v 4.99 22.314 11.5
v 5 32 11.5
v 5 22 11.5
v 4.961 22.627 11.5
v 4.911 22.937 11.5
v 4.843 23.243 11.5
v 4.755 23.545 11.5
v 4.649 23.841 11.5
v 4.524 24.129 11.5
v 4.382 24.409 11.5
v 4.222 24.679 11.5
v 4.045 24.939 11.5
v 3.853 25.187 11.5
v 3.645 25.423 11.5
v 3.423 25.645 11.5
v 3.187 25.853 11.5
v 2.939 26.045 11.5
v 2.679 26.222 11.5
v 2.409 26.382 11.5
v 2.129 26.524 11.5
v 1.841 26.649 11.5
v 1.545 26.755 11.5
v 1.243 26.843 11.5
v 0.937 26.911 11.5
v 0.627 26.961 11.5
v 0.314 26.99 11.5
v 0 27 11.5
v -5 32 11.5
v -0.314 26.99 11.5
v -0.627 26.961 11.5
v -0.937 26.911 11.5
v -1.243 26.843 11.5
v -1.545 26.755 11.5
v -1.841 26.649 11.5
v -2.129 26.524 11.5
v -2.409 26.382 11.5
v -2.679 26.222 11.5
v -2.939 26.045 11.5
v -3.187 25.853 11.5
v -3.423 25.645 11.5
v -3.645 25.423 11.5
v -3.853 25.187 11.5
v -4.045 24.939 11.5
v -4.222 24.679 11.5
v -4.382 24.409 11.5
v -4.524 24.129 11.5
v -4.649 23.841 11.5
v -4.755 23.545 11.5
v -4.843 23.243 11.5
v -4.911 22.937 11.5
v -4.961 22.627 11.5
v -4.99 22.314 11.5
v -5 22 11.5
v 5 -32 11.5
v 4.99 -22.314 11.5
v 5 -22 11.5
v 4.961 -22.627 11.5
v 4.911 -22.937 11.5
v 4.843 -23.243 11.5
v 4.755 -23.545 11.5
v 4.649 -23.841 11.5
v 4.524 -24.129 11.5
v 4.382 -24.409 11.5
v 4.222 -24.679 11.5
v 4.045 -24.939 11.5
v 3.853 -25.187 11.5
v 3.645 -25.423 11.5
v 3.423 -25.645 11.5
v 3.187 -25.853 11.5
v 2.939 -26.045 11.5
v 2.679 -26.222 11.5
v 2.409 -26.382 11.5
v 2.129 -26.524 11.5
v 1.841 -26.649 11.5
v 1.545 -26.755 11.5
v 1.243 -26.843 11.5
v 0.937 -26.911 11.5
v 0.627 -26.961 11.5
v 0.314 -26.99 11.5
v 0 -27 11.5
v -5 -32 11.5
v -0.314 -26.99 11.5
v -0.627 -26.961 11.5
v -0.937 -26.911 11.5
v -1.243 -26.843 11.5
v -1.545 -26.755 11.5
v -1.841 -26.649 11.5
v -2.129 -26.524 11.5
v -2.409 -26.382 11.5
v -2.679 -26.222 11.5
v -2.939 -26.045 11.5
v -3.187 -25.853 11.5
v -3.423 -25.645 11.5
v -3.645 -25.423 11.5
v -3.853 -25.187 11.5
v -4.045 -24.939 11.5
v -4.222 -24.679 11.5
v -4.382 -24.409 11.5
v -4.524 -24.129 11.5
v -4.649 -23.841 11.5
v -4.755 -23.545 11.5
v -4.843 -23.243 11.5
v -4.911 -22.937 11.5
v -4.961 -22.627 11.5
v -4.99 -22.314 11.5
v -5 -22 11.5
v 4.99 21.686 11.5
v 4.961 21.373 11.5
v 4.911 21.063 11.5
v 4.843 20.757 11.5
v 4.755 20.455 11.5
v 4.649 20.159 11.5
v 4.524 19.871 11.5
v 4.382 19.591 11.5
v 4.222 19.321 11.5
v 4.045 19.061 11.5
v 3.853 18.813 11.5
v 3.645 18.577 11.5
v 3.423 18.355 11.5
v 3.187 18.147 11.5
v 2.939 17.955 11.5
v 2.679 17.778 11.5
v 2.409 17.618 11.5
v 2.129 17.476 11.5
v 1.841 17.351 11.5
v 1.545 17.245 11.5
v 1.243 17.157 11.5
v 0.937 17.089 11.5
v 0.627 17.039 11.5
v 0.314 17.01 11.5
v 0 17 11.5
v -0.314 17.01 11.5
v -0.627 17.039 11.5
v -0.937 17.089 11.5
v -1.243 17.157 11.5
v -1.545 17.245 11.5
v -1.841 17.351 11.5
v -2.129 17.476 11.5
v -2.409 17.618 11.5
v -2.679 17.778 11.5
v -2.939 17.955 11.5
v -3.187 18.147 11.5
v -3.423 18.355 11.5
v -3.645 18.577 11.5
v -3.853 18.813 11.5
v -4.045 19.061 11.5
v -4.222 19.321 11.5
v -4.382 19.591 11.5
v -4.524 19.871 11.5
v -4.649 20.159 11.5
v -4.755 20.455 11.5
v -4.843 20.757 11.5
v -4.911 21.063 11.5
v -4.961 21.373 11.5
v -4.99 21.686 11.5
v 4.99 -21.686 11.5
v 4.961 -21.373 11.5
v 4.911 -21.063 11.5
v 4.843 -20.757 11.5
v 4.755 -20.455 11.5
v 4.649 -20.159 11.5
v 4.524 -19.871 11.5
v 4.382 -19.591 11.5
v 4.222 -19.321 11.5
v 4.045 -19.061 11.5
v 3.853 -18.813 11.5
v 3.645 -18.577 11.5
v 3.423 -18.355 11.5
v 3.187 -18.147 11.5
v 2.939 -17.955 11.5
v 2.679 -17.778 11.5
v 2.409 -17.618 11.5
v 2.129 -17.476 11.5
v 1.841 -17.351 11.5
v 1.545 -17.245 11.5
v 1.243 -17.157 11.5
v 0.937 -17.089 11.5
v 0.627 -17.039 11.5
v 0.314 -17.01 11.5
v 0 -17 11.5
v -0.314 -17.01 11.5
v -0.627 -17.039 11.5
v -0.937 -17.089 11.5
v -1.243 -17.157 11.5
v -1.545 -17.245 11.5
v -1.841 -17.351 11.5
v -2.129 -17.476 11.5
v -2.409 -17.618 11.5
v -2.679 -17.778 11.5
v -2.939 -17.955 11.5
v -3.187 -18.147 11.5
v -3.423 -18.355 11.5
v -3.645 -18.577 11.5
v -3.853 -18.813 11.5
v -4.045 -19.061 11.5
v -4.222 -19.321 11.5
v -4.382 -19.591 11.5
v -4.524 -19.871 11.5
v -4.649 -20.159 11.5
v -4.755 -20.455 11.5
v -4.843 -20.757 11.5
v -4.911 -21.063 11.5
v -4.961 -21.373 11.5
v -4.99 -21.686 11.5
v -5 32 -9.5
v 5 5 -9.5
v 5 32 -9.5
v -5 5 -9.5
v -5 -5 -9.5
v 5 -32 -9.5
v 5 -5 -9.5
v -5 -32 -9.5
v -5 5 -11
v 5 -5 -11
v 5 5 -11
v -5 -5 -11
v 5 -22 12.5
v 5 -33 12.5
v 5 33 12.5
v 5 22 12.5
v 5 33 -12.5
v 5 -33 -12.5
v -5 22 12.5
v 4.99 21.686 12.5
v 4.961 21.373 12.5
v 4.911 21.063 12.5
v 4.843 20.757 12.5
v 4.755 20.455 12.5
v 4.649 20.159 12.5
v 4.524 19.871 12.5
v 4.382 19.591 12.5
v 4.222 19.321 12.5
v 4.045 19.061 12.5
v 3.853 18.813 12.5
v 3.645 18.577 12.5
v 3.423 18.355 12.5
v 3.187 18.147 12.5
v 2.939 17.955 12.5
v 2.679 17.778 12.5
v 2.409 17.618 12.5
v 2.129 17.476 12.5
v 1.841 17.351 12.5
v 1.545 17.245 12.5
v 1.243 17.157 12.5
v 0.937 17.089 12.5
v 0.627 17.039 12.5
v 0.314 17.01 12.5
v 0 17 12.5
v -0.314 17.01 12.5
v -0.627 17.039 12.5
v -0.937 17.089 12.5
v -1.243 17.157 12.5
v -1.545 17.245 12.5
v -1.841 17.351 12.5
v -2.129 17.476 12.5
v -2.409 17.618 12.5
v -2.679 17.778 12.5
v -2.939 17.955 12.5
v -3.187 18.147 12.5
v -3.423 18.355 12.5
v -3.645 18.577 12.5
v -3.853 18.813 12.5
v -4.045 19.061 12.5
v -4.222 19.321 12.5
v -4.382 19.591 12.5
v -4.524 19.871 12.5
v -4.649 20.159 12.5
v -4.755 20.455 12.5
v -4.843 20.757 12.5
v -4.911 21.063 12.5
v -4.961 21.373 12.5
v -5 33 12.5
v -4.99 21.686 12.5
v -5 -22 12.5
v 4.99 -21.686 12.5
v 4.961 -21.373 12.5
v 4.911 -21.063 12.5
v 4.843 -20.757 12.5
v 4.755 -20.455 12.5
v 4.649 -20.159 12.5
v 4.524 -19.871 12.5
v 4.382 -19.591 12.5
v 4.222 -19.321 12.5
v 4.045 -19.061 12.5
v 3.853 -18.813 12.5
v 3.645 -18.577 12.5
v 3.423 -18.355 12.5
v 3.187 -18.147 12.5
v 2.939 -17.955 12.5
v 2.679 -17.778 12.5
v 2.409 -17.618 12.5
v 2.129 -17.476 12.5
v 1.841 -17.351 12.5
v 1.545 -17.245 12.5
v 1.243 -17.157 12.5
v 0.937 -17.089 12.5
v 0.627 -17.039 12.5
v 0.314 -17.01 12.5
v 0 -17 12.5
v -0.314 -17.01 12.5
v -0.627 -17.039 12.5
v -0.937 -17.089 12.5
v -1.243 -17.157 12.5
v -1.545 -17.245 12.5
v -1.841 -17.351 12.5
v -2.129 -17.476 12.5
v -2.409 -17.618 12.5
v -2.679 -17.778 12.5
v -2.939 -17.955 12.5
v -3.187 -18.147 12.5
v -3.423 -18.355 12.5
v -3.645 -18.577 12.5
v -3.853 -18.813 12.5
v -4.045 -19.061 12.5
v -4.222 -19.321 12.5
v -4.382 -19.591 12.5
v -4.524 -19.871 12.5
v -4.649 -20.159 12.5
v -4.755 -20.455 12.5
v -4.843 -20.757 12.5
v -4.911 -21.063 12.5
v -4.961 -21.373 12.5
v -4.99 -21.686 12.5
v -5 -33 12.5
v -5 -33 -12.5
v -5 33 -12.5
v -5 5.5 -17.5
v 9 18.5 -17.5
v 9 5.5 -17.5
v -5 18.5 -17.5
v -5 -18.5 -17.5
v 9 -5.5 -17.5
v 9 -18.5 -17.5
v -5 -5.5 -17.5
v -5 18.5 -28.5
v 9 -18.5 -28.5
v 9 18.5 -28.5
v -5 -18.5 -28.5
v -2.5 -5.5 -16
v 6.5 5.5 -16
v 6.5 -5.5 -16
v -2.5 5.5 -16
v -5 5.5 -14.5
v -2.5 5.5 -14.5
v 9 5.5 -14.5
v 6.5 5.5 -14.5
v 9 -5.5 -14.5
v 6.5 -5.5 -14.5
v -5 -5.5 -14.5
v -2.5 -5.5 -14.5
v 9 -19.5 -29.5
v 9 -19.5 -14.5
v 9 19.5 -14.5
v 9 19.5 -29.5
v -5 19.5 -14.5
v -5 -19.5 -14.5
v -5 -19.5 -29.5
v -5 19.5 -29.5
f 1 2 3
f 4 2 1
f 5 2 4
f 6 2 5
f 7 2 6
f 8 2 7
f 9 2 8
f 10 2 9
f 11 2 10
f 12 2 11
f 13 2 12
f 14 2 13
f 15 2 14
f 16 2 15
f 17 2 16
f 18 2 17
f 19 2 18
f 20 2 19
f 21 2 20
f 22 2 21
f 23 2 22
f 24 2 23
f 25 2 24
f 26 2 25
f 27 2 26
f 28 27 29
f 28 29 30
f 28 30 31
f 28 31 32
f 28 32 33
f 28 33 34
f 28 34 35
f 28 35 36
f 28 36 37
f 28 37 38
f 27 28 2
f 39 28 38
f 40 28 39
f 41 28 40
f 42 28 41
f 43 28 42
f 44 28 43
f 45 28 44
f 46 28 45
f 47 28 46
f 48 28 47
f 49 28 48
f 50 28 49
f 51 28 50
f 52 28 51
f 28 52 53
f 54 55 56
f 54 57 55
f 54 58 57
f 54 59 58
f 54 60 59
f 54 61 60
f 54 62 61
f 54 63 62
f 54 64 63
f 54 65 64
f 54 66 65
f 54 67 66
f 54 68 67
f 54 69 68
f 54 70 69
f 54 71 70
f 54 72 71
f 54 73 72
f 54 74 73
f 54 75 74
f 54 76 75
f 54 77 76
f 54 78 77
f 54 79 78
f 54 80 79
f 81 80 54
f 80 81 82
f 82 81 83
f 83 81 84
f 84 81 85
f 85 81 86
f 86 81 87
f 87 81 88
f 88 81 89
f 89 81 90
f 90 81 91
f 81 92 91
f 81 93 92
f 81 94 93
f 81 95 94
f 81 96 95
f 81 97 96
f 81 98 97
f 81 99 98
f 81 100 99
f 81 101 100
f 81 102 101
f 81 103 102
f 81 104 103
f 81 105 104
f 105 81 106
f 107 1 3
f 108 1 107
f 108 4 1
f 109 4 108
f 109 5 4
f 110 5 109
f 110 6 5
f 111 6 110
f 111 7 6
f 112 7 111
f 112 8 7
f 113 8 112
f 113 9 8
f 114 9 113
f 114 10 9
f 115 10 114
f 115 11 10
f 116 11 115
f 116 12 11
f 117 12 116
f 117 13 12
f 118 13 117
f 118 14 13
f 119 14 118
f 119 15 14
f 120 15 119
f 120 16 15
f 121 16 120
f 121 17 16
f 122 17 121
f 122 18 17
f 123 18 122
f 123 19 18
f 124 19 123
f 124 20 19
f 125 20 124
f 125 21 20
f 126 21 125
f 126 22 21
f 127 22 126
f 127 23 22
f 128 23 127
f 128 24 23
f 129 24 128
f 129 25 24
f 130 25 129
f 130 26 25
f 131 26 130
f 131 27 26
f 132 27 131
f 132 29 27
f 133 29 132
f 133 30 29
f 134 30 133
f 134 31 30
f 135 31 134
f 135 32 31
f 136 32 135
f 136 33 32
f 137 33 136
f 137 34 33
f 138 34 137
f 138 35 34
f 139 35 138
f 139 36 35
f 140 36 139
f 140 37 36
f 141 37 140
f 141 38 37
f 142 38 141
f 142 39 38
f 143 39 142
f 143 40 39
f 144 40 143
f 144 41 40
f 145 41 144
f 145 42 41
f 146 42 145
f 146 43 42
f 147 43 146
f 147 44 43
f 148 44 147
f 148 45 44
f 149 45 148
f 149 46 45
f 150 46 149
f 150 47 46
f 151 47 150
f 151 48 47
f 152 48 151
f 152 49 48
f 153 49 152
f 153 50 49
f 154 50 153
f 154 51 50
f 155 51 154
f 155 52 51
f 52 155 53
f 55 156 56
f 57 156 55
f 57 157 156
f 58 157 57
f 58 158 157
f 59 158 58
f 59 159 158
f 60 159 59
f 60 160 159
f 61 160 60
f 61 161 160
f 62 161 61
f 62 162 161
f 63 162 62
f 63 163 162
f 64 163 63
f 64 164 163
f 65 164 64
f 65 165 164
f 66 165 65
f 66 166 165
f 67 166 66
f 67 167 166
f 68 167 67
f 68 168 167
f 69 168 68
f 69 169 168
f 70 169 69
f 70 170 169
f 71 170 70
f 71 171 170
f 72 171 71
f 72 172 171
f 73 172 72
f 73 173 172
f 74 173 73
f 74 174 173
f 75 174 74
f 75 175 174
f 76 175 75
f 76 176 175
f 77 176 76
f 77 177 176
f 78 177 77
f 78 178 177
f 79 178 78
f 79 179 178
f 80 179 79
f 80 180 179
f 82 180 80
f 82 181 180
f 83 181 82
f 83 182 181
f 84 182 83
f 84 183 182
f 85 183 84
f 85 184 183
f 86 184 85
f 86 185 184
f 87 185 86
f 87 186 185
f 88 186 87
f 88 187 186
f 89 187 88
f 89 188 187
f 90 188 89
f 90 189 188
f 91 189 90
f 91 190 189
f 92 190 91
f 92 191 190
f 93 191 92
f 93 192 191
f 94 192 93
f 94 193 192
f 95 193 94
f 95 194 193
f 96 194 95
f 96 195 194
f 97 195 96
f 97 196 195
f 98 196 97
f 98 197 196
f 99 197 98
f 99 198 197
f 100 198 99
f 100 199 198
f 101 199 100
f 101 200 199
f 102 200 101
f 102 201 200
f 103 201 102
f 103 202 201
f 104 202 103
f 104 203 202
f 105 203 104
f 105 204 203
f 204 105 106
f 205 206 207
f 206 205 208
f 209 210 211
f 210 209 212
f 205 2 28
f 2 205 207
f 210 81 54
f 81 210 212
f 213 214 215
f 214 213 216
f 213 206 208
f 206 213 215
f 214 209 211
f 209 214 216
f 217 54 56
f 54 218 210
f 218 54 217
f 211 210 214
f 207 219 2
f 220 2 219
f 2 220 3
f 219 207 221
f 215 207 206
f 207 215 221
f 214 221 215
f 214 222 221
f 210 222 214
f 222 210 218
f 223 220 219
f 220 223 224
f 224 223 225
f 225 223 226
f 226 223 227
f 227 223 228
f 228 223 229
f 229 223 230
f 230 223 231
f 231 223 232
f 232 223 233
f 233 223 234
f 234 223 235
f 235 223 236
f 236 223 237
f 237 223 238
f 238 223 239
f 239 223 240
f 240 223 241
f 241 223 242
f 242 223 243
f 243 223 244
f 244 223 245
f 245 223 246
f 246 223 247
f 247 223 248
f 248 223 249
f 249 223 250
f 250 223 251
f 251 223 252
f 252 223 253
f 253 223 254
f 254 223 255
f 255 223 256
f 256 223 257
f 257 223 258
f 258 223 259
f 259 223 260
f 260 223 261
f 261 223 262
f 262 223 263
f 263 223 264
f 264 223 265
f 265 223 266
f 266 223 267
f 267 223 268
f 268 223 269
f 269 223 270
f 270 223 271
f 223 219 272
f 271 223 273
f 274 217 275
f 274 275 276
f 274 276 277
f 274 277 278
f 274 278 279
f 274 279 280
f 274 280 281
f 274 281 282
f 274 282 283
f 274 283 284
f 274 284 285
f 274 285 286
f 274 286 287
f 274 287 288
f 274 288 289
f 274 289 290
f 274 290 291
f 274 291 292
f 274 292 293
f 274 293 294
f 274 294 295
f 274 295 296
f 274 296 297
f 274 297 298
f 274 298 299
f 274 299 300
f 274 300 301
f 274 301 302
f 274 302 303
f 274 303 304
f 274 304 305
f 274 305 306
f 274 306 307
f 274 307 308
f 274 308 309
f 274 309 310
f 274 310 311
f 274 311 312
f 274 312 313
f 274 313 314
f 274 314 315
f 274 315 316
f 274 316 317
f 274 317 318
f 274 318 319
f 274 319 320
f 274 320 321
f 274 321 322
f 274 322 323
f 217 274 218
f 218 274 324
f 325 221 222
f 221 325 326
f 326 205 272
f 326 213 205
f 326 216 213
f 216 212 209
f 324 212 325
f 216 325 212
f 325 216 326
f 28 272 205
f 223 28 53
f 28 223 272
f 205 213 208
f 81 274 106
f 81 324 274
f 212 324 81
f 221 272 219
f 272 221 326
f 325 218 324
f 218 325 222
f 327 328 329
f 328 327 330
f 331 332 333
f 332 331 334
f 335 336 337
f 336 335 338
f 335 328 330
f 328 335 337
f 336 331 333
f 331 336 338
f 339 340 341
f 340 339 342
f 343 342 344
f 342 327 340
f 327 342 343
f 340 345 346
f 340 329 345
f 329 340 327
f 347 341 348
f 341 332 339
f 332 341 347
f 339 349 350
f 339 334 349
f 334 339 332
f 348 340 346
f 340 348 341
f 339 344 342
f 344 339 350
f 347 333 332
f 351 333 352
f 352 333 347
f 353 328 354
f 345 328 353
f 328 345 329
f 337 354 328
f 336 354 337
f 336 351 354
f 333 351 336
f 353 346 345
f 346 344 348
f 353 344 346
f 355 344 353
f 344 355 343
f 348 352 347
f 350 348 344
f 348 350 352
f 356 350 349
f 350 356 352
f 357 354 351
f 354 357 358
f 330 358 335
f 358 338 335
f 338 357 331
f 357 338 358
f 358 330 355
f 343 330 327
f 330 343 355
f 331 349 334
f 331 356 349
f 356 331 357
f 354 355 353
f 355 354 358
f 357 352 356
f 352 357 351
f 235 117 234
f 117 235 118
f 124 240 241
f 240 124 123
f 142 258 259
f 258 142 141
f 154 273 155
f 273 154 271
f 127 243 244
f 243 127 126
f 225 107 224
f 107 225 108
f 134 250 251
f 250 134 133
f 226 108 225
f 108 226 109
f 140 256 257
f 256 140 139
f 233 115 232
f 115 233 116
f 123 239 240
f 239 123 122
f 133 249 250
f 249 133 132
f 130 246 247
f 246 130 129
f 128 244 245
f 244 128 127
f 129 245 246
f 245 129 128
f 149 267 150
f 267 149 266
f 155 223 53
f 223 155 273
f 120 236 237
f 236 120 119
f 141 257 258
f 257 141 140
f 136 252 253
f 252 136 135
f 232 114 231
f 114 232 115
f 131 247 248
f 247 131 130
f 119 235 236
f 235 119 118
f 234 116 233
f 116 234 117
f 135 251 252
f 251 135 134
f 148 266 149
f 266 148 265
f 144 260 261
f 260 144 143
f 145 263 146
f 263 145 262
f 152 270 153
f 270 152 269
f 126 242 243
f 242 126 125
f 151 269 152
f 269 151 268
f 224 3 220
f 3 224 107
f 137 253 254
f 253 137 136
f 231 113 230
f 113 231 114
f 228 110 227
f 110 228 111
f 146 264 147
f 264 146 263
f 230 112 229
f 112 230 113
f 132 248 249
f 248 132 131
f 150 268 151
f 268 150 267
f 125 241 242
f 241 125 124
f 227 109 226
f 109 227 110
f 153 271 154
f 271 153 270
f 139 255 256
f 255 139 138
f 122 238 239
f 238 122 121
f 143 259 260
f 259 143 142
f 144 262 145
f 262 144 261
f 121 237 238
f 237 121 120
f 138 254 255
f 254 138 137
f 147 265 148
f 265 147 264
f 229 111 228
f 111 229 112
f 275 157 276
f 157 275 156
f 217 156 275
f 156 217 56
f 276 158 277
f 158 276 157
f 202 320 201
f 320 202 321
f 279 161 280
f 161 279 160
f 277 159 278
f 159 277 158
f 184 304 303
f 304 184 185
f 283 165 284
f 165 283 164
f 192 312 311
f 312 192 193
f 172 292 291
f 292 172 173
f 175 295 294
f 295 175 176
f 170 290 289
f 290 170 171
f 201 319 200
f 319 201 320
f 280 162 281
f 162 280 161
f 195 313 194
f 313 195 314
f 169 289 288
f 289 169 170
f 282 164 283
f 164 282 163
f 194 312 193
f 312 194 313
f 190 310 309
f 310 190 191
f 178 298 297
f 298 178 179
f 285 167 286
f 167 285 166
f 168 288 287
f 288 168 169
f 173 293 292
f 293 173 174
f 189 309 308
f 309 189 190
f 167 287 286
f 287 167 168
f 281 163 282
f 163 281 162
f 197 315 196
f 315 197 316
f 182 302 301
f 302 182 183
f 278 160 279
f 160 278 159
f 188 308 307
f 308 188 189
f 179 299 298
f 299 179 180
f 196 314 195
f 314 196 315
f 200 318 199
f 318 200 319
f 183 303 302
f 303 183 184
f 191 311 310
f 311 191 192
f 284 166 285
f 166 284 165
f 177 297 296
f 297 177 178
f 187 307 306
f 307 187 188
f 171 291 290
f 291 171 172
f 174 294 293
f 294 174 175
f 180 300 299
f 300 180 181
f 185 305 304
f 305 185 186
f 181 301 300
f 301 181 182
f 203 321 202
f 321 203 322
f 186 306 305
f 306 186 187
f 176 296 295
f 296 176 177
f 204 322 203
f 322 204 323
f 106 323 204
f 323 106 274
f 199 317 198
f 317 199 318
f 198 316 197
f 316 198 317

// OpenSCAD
module holder() {
    difference() {
        cube([10,66,25], center = true);
        union() {
            translate([0,0,1]) cube([30,64,21], center = true);
            translate([0,0,4]) cube([30,44,21], center = true);
            translate([0,0,-6]) cube([12,10,10], center = true);
        }
    }
}

module camera_holder() {
    union(){
        translate([0,0,-22]) difference() {
            translate([0,0,0]) cube([14,39,15], center = true);
            union() {
                translate([0,0,-1]) cube([30,37,11], center = true);
                //translate([0,0,-2]) cube([21,20,9], center = true);
                translate([0,0,1]) cube([11,11,10], center = true);
                translate([9.5,0,5]) cube([10,11,10], center = true);
                translate([-9.5,0,5]) cube([10,11,10], center = true);
            }
        }

    }
}


union() {
    holder();
    translate([2, 0, 0]) camera_holder();
    translate([0, 22,11.5]) cylinder(r=5,h=1, $fn=100);
    translate([0, -22,11.5]) cylinder(r=5,h=1, $fn=100);
}
